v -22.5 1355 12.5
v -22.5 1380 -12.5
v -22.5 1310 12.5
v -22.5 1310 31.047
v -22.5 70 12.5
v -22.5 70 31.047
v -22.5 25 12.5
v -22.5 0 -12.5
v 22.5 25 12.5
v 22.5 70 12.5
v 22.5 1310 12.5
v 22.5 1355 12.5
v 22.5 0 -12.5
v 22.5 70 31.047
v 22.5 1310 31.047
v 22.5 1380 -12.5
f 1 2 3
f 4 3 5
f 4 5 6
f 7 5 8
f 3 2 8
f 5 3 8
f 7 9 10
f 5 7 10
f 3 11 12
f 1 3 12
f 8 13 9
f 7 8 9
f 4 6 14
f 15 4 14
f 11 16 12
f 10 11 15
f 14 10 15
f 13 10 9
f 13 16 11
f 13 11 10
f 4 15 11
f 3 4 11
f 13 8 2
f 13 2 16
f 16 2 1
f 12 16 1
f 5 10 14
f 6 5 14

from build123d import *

# Parameters (mm, degrees)
F0_W      = 45
F0_H      = 25
F1_DEPTH  = 1380
F3_DEPTH  = 45
F5_DEPTH  = 45
F6_W      = 45
F6_H      = 18.5474166647
F7_DEPTH  = 1380
F9_DEPTH  = 45
F11_DEPTH = 45


with BuildPart() as f1:
    # F0 (on Front) → F1 (new body)
    with BuildSketch(Plane.XZ):
        Rectangle(F0_W, F0_H)
    extrude(amount=-F1_DEPTH)

    # F2 (on face) → F3 (cut)
    with BuildSketch(Plane.YZ.offset(22.5)):
        Polygon((0, 12.5), (0, -12.5), (25, 12.5), align=None)
    extrude(amount=-F3_DEPTH, mode=Mode.SUBTRACT)

    # F4 (on face) → F5 (cut)
    with BuildSketch(Plane(origin=(-22.5, 0, 0), x_dir=(0, -1, 0), z_dir=(-1, 0, 0))):
        Polygon((-1380, 12.5), (-1380, -12.5), (-1355, 12.5), align=None)
    extrude(amount=-F5_DEPTH, mode=Mode.SUBTRACT)

    # F6 (on Front) → F7 (join)
    with BuildSketch(Plane.XZ):
        with Locations((0, 21.7737083323)):
            Rectangle(F6_W, F6_H)
    extrude(amount=-F7_DEPTH)

    # F8 (on face) → F9 (cut)
    with BuildSketch(Plane.YZ.offset(22.5)):
        Polygon((70, 31.0474166647), (0, 31.0474166647), (0, 12.5), (25, 12.5), (70, 12.5), align=None)
    extrude(amount=-F9_DEPTH, mode=Mode.SUBTRACT)

    # F10 (on face) → F11 (cut)
    with BuildSketch(Plane.YZ.offset(22.5)):
        Polygon((1355, 12.5), (1380, 12.5), (1380, 31.0474166647), (1310, 31.0474166647), (1310, 12.5), align=None)
    extrude(amount=-F11_DEPTH, mode=Mode.SUBTRACT)


solid = f1.part
